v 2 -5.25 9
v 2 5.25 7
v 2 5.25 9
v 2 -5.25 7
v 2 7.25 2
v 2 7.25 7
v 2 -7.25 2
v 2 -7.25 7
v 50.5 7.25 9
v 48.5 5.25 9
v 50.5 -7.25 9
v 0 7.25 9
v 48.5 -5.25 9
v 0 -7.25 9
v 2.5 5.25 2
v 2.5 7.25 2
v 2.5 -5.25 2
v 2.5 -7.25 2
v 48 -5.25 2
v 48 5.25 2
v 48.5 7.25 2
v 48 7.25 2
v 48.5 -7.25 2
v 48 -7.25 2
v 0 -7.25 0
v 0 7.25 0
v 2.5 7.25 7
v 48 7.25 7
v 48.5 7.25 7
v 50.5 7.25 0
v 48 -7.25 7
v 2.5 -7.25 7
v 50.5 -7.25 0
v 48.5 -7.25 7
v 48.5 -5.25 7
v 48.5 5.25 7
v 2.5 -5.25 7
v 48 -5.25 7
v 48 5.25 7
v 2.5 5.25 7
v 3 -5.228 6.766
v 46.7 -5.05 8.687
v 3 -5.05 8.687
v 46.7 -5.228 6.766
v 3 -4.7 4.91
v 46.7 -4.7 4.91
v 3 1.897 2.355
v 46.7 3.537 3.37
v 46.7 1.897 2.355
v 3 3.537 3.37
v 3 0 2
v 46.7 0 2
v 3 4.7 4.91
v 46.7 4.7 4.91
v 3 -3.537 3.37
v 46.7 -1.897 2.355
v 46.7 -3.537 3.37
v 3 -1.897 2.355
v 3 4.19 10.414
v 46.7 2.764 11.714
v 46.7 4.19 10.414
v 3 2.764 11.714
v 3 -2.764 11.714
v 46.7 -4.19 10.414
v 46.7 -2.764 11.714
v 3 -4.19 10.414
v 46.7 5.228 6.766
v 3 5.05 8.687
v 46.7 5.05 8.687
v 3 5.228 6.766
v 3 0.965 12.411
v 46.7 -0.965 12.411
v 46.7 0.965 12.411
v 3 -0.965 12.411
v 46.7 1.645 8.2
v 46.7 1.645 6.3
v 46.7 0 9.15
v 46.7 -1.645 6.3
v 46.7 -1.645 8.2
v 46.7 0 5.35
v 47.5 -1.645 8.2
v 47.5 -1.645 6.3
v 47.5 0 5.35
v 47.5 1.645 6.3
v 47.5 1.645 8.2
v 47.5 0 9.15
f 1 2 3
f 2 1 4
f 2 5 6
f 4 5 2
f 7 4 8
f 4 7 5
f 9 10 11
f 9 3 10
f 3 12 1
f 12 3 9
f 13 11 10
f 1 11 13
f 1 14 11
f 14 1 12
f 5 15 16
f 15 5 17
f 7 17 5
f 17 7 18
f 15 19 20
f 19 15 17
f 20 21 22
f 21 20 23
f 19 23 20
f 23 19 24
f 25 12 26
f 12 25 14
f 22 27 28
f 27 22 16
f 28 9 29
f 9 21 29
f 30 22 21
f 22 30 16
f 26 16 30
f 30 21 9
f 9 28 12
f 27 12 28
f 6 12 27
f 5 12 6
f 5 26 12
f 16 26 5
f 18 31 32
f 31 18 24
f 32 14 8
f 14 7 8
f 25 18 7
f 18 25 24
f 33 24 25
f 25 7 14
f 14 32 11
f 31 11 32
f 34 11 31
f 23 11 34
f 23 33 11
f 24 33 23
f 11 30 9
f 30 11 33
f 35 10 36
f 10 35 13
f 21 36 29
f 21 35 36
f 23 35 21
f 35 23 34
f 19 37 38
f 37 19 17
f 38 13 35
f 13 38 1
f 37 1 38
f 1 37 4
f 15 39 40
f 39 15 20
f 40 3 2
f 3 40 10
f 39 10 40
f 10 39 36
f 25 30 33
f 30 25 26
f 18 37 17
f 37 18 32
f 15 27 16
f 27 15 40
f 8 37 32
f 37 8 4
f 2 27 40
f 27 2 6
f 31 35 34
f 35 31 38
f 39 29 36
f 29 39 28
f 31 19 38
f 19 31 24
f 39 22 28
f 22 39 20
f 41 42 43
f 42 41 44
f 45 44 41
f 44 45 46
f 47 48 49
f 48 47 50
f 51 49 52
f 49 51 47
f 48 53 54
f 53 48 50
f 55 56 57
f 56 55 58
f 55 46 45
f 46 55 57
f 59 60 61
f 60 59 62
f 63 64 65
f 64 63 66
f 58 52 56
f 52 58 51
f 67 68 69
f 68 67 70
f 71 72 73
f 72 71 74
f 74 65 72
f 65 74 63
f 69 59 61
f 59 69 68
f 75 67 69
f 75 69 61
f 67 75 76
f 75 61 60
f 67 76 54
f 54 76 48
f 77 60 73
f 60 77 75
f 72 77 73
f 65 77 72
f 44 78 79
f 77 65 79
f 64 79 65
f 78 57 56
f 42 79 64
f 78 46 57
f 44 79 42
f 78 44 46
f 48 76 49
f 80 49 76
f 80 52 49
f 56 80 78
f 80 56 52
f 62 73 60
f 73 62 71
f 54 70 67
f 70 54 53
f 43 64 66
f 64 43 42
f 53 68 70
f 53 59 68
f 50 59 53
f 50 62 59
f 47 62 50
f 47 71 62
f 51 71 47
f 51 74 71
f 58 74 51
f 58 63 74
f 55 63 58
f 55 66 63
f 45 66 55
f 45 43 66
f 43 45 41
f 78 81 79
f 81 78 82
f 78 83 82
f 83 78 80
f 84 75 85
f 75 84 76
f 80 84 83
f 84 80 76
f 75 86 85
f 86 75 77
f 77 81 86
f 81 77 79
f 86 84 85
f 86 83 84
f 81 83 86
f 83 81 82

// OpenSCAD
aaa_diameter=10.5;
aaa_height=44.5;

module aaa_battery() {
  color([0, 0.6, 0]) cylinder(d=aaa_diameter, h=aaa_height-0.8);
  color([0.7, 0.7, 0.7]) translate([0,0,0.5]) cylinder(d=3.8, h=aaa_height-0.5);
}

module aaa_holder(thickness=2, with_baterry=false) {
  tolerance=2;
  width=thickness*2+aaa_diameter;

  difference() {
    union() {
      translate([0,-width/2,0])
        cube([thickness*2+aaa_height+tolerance, width, thickness]);  
      for (i=[0, thickness+aaa_height+tolerance]) {
        translate([i,-width/2,thickness]) cube([thickness, width, 7]);
      }
      for (i=[-width/2:width-thickness:width/2]) {
        translate([0,i,thickness]) cube([aaa_height+tolerance+2*thickness, thickness, 7]);
      }
    }
    for (i=[thickness, thickness+tolerance+aaa_height-0.5])
      translate([i, -width, thickness]) cube([0.5, width*2, 5]);
  }
  if (with_baterry) {
    translate([thickness+tolerance/2, 0, thickness+aaa_diameter/2]) rotate([0,90,]) aaa_battery();
  }
}

aaa_holder(with_baterry=true);
